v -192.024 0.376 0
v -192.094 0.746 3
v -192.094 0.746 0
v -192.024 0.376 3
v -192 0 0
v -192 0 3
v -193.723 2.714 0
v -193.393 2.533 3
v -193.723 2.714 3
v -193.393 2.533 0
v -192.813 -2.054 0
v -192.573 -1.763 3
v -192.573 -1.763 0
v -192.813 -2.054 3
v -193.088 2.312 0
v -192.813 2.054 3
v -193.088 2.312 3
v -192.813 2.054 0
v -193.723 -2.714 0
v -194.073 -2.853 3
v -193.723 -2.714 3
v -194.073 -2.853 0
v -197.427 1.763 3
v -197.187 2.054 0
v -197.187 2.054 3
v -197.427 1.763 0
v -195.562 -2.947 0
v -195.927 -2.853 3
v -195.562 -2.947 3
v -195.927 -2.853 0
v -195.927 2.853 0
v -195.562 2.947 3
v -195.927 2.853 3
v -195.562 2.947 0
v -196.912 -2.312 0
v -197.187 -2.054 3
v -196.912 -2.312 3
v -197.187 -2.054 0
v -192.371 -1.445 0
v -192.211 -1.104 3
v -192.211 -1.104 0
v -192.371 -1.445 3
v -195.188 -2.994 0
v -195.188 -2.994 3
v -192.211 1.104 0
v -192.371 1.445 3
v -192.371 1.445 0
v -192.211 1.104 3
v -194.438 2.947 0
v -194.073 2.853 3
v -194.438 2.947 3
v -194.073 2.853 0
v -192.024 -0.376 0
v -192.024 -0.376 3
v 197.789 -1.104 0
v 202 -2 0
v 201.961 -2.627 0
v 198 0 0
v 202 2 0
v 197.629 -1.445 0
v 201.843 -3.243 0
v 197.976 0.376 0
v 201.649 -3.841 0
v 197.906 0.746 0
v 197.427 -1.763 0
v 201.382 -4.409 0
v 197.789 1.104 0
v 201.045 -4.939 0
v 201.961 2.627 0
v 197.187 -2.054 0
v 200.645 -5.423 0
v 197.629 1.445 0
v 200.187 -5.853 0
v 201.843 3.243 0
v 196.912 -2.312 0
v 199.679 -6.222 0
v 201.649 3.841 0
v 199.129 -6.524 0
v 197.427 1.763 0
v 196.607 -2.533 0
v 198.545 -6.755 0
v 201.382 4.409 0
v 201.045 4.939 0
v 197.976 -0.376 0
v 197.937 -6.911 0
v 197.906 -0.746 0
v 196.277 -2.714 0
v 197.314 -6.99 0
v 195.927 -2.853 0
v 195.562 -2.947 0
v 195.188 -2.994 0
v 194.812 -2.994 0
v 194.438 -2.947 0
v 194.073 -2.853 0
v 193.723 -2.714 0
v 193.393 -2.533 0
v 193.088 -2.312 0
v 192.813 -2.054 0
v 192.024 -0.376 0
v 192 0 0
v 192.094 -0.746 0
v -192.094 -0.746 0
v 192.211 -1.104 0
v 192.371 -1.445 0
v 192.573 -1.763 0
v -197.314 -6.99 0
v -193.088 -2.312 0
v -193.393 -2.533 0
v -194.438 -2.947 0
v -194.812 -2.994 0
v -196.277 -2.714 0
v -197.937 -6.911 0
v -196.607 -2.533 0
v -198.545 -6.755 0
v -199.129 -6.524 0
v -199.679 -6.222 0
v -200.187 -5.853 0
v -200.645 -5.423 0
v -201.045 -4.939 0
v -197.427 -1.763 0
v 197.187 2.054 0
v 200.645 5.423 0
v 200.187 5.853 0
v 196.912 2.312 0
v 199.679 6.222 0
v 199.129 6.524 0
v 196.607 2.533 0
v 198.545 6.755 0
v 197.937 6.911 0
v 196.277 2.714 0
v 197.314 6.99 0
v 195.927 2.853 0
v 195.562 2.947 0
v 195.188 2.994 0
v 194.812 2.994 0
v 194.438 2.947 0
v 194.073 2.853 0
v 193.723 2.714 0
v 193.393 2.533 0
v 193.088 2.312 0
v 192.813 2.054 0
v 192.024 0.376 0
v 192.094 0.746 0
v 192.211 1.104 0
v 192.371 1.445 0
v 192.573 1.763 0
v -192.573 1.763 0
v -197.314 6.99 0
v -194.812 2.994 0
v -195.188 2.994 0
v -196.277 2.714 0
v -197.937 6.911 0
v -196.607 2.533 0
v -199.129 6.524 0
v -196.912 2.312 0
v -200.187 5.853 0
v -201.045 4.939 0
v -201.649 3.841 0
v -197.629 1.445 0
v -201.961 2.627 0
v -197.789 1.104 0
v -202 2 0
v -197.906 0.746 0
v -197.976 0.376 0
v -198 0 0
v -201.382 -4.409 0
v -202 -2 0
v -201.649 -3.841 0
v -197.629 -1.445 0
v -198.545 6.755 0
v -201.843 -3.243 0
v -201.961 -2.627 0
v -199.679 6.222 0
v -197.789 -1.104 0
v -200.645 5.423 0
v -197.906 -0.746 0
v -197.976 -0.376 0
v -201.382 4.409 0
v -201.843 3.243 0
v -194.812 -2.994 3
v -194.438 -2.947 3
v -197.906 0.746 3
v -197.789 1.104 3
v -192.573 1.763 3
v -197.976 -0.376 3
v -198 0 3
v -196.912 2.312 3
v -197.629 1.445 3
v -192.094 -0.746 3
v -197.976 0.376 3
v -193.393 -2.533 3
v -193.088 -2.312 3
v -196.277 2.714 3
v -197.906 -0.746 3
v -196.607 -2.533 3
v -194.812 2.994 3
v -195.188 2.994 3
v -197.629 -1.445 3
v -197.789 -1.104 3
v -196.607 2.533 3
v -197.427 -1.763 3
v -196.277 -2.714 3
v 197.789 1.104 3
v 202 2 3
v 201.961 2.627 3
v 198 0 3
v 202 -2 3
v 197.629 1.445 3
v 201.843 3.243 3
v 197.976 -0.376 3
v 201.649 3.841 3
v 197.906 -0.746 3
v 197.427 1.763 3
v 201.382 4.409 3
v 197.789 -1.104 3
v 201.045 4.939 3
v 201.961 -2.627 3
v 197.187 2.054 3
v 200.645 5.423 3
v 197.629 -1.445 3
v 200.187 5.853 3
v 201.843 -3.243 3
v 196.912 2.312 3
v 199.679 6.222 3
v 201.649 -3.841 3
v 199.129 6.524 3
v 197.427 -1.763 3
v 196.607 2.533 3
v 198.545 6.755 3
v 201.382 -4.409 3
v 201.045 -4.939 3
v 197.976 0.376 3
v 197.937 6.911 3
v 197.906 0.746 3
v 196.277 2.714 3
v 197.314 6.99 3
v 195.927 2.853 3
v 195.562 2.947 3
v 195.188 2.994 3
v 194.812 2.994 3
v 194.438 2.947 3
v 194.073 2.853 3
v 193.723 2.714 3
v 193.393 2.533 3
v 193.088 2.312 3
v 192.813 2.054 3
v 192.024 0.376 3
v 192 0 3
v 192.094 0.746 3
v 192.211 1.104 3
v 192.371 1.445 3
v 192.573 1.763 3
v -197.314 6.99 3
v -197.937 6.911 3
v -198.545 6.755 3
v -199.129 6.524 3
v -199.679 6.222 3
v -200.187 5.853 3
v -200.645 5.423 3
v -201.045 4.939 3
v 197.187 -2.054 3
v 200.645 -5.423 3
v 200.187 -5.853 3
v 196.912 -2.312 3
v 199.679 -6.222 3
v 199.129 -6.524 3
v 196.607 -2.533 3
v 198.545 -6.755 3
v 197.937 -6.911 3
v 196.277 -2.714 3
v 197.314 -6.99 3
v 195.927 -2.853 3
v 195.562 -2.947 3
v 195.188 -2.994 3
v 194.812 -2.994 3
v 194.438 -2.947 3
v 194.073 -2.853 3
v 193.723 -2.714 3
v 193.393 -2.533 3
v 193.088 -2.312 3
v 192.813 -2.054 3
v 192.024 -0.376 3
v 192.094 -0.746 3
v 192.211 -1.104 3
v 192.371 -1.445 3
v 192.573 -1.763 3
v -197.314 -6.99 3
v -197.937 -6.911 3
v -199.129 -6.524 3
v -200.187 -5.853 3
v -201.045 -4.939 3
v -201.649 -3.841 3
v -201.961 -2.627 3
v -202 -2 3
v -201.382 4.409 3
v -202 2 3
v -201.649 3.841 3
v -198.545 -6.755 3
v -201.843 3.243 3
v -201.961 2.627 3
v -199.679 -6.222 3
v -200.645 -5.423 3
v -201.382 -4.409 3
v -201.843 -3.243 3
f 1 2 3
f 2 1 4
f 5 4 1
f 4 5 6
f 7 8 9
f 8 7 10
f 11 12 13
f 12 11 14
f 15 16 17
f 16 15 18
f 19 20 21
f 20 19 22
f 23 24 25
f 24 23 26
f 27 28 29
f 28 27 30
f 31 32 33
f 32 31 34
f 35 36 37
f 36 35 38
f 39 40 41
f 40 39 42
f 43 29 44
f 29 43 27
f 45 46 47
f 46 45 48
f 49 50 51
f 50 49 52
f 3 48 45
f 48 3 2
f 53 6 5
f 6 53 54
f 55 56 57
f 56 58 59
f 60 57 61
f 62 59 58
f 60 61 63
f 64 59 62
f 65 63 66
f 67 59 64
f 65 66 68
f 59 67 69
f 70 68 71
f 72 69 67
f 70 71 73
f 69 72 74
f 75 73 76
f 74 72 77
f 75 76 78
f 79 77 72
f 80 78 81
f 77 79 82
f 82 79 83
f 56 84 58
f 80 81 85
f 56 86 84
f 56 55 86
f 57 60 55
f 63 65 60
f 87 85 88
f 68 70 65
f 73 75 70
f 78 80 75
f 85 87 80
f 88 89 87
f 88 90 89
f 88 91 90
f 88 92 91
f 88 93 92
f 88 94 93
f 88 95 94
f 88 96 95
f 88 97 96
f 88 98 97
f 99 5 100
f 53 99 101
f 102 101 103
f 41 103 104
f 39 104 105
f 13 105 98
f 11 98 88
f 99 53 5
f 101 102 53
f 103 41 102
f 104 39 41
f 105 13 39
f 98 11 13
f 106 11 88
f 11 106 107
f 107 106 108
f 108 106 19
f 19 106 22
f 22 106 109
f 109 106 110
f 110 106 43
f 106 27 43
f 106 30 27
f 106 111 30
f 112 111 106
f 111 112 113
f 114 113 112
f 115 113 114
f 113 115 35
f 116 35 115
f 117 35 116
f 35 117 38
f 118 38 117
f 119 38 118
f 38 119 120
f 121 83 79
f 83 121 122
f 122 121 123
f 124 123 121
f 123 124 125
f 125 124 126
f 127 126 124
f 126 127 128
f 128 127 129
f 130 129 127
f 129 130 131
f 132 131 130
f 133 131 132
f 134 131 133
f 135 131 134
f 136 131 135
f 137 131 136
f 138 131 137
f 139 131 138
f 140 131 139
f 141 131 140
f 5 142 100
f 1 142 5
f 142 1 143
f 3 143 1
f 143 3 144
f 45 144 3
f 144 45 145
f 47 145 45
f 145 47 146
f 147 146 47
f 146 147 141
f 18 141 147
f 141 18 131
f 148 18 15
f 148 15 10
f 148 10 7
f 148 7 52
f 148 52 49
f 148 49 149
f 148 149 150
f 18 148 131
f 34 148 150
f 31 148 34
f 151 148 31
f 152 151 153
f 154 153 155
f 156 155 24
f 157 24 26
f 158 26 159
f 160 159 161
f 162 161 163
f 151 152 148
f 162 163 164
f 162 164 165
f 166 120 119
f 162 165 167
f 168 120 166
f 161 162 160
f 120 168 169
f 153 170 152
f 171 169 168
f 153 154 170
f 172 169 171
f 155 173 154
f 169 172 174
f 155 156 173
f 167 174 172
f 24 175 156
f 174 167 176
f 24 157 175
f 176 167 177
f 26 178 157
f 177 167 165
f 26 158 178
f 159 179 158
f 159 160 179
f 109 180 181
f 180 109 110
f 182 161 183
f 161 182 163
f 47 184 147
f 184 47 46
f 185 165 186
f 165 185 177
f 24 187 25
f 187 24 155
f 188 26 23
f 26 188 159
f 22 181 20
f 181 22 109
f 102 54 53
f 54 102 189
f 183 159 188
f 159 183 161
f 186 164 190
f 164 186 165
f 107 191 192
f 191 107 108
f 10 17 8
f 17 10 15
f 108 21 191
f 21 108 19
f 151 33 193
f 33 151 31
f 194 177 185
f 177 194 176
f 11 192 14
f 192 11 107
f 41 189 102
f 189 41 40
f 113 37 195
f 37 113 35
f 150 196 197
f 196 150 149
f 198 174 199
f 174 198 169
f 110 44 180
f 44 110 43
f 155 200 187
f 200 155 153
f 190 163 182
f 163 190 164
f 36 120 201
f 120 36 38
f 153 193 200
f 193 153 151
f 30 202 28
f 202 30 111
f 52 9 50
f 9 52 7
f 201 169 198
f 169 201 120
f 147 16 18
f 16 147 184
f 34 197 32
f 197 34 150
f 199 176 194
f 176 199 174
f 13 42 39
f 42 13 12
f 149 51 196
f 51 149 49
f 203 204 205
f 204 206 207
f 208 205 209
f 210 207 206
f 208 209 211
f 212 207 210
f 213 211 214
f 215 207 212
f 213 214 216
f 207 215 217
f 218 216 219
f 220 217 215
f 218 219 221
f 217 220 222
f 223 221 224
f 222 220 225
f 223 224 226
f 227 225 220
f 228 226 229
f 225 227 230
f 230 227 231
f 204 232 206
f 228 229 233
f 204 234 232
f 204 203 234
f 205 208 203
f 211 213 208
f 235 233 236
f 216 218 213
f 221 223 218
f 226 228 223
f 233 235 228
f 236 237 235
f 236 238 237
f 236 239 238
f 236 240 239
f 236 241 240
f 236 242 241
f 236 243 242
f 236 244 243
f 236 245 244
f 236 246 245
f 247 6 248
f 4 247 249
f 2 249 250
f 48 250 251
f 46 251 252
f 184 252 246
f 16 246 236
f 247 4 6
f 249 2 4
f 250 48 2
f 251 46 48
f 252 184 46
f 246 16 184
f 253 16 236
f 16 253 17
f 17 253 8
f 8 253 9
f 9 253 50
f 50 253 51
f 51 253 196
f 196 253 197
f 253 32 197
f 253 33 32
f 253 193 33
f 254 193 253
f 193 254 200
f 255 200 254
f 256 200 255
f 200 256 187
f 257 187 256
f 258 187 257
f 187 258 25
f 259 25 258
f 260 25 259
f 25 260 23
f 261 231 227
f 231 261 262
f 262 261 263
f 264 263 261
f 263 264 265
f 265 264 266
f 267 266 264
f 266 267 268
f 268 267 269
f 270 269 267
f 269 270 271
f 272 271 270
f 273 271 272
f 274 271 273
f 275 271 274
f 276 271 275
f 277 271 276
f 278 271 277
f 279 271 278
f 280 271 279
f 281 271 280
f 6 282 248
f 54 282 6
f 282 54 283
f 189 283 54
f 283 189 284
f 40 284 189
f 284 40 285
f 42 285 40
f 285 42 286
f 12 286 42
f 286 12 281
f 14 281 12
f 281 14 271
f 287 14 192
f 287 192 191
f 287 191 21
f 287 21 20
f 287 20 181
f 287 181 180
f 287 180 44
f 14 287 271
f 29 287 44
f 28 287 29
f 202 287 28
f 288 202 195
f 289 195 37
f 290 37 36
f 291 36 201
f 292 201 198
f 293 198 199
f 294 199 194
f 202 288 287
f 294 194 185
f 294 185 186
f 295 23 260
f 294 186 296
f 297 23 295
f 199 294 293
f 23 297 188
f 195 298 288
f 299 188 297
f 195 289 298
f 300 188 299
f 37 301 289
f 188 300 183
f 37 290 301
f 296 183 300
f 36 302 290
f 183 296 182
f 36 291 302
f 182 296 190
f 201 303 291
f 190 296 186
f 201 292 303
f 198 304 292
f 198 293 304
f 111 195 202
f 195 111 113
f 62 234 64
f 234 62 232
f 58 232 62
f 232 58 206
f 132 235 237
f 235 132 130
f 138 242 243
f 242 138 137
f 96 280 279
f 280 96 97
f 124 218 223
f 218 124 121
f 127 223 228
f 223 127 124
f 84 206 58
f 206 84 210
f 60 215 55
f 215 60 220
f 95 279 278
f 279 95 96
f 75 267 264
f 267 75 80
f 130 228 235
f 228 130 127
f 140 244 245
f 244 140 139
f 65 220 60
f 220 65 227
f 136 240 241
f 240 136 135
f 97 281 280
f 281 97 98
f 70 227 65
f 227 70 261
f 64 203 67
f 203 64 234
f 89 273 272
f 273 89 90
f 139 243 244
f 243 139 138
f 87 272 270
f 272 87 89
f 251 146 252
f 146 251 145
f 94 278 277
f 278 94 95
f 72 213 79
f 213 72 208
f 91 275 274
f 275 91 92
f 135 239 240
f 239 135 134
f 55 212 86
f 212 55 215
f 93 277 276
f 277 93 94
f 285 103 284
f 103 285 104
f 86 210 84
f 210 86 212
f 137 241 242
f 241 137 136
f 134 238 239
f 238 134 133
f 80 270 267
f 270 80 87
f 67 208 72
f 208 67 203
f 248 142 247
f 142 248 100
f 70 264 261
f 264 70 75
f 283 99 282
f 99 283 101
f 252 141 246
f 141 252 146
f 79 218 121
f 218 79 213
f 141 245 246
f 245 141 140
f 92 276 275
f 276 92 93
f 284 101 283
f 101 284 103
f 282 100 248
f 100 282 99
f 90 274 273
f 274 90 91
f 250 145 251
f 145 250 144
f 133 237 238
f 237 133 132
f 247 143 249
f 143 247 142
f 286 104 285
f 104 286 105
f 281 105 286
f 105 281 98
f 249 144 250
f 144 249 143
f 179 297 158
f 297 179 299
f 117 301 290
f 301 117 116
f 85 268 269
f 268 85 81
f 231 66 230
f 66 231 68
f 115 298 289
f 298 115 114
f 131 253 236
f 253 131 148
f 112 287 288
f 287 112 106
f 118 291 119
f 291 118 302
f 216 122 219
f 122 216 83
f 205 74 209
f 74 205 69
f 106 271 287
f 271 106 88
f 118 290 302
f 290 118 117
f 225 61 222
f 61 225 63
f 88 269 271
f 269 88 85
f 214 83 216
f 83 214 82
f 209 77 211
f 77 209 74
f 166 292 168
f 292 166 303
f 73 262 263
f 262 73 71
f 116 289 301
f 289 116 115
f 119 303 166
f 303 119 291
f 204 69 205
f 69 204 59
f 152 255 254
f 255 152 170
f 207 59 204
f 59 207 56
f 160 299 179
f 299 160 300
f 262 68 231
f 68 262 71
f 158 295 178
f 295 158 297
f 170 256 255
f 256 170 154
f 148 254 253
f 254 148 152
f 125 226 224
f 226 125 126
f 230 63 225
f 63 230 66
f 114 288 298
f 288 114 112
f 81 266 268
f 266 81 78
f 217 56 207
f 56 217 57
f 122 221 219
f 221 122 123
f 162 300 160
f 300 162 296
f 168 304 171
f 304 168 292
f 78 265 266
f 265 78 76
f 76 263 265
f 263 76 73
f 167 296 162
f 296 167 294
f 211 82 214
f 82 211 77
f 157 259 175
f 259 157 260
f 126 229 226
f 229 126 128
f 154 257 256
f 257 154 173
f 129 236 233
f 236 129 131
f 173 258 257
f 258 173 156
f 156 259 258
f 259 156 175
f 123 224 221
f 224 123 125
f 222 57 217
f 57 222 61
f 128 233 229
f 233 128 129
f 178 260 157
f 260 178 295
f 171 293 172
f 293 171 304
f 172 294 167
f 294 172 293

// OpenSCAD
$fn = 50;


difference() {
	union() {
		hull() {
			translate(v = [-197.0000000000, 2.0000000000, 0]) {
				cylinder(h = 3, r = 5);
			}
			translate(v = [197.0000000000, 2.0000000000, 0]) {
				cylinder(h = 3, r = 5);
			}
			translate(v = [-197.0000000000, -2.0000000000, 0]) {
				cylinder(h = 3, r = 5);
			}
			translate(v = [197.0000000000, -2.0000000000, 0]) {
				cylinder(h = 3, r = 5);
			}
		}
	}
	union() {
		translate(v = [-195.0000000000, 0.0000000000, 0]) {
			cylinder(h = 3, r = 3.0000000000);
		}
		translate(v = [195.0000000000, 0.0000000000, 0]) {
			cylinder(h = 3, r = 3.0000000000);
		}
		translate(v = [-195.0000000000, 0.0000000000, 0]) {
			cylinder(h = 3, r = 1.5000000000);
		}
		translate(v = [195.0000000000, 0.0000000000, 0]) {
			cylinder(h = 3, r = 1.5000000000);
		}
		translate(v = [-195.0000000000, 0.0000000000, 0]) {
			cylinder(h = 3, r = 1.5000000000);
		}
		translate(v = [195.0000000000, 0.0000000000, 0]) {
			cylinder(h = 3, r = 1.5000000000);
		}
		translate(v = [-195.0000000000, 0.0000000000, 0]) {
			cylinder(h = 3, r = 1.5000000000);
		}
		translate(v = [195.0000000000, 0.0000000000, 0]) {
			cylinder(h = 3, r = 1.5000000000);
		}
	}
}
